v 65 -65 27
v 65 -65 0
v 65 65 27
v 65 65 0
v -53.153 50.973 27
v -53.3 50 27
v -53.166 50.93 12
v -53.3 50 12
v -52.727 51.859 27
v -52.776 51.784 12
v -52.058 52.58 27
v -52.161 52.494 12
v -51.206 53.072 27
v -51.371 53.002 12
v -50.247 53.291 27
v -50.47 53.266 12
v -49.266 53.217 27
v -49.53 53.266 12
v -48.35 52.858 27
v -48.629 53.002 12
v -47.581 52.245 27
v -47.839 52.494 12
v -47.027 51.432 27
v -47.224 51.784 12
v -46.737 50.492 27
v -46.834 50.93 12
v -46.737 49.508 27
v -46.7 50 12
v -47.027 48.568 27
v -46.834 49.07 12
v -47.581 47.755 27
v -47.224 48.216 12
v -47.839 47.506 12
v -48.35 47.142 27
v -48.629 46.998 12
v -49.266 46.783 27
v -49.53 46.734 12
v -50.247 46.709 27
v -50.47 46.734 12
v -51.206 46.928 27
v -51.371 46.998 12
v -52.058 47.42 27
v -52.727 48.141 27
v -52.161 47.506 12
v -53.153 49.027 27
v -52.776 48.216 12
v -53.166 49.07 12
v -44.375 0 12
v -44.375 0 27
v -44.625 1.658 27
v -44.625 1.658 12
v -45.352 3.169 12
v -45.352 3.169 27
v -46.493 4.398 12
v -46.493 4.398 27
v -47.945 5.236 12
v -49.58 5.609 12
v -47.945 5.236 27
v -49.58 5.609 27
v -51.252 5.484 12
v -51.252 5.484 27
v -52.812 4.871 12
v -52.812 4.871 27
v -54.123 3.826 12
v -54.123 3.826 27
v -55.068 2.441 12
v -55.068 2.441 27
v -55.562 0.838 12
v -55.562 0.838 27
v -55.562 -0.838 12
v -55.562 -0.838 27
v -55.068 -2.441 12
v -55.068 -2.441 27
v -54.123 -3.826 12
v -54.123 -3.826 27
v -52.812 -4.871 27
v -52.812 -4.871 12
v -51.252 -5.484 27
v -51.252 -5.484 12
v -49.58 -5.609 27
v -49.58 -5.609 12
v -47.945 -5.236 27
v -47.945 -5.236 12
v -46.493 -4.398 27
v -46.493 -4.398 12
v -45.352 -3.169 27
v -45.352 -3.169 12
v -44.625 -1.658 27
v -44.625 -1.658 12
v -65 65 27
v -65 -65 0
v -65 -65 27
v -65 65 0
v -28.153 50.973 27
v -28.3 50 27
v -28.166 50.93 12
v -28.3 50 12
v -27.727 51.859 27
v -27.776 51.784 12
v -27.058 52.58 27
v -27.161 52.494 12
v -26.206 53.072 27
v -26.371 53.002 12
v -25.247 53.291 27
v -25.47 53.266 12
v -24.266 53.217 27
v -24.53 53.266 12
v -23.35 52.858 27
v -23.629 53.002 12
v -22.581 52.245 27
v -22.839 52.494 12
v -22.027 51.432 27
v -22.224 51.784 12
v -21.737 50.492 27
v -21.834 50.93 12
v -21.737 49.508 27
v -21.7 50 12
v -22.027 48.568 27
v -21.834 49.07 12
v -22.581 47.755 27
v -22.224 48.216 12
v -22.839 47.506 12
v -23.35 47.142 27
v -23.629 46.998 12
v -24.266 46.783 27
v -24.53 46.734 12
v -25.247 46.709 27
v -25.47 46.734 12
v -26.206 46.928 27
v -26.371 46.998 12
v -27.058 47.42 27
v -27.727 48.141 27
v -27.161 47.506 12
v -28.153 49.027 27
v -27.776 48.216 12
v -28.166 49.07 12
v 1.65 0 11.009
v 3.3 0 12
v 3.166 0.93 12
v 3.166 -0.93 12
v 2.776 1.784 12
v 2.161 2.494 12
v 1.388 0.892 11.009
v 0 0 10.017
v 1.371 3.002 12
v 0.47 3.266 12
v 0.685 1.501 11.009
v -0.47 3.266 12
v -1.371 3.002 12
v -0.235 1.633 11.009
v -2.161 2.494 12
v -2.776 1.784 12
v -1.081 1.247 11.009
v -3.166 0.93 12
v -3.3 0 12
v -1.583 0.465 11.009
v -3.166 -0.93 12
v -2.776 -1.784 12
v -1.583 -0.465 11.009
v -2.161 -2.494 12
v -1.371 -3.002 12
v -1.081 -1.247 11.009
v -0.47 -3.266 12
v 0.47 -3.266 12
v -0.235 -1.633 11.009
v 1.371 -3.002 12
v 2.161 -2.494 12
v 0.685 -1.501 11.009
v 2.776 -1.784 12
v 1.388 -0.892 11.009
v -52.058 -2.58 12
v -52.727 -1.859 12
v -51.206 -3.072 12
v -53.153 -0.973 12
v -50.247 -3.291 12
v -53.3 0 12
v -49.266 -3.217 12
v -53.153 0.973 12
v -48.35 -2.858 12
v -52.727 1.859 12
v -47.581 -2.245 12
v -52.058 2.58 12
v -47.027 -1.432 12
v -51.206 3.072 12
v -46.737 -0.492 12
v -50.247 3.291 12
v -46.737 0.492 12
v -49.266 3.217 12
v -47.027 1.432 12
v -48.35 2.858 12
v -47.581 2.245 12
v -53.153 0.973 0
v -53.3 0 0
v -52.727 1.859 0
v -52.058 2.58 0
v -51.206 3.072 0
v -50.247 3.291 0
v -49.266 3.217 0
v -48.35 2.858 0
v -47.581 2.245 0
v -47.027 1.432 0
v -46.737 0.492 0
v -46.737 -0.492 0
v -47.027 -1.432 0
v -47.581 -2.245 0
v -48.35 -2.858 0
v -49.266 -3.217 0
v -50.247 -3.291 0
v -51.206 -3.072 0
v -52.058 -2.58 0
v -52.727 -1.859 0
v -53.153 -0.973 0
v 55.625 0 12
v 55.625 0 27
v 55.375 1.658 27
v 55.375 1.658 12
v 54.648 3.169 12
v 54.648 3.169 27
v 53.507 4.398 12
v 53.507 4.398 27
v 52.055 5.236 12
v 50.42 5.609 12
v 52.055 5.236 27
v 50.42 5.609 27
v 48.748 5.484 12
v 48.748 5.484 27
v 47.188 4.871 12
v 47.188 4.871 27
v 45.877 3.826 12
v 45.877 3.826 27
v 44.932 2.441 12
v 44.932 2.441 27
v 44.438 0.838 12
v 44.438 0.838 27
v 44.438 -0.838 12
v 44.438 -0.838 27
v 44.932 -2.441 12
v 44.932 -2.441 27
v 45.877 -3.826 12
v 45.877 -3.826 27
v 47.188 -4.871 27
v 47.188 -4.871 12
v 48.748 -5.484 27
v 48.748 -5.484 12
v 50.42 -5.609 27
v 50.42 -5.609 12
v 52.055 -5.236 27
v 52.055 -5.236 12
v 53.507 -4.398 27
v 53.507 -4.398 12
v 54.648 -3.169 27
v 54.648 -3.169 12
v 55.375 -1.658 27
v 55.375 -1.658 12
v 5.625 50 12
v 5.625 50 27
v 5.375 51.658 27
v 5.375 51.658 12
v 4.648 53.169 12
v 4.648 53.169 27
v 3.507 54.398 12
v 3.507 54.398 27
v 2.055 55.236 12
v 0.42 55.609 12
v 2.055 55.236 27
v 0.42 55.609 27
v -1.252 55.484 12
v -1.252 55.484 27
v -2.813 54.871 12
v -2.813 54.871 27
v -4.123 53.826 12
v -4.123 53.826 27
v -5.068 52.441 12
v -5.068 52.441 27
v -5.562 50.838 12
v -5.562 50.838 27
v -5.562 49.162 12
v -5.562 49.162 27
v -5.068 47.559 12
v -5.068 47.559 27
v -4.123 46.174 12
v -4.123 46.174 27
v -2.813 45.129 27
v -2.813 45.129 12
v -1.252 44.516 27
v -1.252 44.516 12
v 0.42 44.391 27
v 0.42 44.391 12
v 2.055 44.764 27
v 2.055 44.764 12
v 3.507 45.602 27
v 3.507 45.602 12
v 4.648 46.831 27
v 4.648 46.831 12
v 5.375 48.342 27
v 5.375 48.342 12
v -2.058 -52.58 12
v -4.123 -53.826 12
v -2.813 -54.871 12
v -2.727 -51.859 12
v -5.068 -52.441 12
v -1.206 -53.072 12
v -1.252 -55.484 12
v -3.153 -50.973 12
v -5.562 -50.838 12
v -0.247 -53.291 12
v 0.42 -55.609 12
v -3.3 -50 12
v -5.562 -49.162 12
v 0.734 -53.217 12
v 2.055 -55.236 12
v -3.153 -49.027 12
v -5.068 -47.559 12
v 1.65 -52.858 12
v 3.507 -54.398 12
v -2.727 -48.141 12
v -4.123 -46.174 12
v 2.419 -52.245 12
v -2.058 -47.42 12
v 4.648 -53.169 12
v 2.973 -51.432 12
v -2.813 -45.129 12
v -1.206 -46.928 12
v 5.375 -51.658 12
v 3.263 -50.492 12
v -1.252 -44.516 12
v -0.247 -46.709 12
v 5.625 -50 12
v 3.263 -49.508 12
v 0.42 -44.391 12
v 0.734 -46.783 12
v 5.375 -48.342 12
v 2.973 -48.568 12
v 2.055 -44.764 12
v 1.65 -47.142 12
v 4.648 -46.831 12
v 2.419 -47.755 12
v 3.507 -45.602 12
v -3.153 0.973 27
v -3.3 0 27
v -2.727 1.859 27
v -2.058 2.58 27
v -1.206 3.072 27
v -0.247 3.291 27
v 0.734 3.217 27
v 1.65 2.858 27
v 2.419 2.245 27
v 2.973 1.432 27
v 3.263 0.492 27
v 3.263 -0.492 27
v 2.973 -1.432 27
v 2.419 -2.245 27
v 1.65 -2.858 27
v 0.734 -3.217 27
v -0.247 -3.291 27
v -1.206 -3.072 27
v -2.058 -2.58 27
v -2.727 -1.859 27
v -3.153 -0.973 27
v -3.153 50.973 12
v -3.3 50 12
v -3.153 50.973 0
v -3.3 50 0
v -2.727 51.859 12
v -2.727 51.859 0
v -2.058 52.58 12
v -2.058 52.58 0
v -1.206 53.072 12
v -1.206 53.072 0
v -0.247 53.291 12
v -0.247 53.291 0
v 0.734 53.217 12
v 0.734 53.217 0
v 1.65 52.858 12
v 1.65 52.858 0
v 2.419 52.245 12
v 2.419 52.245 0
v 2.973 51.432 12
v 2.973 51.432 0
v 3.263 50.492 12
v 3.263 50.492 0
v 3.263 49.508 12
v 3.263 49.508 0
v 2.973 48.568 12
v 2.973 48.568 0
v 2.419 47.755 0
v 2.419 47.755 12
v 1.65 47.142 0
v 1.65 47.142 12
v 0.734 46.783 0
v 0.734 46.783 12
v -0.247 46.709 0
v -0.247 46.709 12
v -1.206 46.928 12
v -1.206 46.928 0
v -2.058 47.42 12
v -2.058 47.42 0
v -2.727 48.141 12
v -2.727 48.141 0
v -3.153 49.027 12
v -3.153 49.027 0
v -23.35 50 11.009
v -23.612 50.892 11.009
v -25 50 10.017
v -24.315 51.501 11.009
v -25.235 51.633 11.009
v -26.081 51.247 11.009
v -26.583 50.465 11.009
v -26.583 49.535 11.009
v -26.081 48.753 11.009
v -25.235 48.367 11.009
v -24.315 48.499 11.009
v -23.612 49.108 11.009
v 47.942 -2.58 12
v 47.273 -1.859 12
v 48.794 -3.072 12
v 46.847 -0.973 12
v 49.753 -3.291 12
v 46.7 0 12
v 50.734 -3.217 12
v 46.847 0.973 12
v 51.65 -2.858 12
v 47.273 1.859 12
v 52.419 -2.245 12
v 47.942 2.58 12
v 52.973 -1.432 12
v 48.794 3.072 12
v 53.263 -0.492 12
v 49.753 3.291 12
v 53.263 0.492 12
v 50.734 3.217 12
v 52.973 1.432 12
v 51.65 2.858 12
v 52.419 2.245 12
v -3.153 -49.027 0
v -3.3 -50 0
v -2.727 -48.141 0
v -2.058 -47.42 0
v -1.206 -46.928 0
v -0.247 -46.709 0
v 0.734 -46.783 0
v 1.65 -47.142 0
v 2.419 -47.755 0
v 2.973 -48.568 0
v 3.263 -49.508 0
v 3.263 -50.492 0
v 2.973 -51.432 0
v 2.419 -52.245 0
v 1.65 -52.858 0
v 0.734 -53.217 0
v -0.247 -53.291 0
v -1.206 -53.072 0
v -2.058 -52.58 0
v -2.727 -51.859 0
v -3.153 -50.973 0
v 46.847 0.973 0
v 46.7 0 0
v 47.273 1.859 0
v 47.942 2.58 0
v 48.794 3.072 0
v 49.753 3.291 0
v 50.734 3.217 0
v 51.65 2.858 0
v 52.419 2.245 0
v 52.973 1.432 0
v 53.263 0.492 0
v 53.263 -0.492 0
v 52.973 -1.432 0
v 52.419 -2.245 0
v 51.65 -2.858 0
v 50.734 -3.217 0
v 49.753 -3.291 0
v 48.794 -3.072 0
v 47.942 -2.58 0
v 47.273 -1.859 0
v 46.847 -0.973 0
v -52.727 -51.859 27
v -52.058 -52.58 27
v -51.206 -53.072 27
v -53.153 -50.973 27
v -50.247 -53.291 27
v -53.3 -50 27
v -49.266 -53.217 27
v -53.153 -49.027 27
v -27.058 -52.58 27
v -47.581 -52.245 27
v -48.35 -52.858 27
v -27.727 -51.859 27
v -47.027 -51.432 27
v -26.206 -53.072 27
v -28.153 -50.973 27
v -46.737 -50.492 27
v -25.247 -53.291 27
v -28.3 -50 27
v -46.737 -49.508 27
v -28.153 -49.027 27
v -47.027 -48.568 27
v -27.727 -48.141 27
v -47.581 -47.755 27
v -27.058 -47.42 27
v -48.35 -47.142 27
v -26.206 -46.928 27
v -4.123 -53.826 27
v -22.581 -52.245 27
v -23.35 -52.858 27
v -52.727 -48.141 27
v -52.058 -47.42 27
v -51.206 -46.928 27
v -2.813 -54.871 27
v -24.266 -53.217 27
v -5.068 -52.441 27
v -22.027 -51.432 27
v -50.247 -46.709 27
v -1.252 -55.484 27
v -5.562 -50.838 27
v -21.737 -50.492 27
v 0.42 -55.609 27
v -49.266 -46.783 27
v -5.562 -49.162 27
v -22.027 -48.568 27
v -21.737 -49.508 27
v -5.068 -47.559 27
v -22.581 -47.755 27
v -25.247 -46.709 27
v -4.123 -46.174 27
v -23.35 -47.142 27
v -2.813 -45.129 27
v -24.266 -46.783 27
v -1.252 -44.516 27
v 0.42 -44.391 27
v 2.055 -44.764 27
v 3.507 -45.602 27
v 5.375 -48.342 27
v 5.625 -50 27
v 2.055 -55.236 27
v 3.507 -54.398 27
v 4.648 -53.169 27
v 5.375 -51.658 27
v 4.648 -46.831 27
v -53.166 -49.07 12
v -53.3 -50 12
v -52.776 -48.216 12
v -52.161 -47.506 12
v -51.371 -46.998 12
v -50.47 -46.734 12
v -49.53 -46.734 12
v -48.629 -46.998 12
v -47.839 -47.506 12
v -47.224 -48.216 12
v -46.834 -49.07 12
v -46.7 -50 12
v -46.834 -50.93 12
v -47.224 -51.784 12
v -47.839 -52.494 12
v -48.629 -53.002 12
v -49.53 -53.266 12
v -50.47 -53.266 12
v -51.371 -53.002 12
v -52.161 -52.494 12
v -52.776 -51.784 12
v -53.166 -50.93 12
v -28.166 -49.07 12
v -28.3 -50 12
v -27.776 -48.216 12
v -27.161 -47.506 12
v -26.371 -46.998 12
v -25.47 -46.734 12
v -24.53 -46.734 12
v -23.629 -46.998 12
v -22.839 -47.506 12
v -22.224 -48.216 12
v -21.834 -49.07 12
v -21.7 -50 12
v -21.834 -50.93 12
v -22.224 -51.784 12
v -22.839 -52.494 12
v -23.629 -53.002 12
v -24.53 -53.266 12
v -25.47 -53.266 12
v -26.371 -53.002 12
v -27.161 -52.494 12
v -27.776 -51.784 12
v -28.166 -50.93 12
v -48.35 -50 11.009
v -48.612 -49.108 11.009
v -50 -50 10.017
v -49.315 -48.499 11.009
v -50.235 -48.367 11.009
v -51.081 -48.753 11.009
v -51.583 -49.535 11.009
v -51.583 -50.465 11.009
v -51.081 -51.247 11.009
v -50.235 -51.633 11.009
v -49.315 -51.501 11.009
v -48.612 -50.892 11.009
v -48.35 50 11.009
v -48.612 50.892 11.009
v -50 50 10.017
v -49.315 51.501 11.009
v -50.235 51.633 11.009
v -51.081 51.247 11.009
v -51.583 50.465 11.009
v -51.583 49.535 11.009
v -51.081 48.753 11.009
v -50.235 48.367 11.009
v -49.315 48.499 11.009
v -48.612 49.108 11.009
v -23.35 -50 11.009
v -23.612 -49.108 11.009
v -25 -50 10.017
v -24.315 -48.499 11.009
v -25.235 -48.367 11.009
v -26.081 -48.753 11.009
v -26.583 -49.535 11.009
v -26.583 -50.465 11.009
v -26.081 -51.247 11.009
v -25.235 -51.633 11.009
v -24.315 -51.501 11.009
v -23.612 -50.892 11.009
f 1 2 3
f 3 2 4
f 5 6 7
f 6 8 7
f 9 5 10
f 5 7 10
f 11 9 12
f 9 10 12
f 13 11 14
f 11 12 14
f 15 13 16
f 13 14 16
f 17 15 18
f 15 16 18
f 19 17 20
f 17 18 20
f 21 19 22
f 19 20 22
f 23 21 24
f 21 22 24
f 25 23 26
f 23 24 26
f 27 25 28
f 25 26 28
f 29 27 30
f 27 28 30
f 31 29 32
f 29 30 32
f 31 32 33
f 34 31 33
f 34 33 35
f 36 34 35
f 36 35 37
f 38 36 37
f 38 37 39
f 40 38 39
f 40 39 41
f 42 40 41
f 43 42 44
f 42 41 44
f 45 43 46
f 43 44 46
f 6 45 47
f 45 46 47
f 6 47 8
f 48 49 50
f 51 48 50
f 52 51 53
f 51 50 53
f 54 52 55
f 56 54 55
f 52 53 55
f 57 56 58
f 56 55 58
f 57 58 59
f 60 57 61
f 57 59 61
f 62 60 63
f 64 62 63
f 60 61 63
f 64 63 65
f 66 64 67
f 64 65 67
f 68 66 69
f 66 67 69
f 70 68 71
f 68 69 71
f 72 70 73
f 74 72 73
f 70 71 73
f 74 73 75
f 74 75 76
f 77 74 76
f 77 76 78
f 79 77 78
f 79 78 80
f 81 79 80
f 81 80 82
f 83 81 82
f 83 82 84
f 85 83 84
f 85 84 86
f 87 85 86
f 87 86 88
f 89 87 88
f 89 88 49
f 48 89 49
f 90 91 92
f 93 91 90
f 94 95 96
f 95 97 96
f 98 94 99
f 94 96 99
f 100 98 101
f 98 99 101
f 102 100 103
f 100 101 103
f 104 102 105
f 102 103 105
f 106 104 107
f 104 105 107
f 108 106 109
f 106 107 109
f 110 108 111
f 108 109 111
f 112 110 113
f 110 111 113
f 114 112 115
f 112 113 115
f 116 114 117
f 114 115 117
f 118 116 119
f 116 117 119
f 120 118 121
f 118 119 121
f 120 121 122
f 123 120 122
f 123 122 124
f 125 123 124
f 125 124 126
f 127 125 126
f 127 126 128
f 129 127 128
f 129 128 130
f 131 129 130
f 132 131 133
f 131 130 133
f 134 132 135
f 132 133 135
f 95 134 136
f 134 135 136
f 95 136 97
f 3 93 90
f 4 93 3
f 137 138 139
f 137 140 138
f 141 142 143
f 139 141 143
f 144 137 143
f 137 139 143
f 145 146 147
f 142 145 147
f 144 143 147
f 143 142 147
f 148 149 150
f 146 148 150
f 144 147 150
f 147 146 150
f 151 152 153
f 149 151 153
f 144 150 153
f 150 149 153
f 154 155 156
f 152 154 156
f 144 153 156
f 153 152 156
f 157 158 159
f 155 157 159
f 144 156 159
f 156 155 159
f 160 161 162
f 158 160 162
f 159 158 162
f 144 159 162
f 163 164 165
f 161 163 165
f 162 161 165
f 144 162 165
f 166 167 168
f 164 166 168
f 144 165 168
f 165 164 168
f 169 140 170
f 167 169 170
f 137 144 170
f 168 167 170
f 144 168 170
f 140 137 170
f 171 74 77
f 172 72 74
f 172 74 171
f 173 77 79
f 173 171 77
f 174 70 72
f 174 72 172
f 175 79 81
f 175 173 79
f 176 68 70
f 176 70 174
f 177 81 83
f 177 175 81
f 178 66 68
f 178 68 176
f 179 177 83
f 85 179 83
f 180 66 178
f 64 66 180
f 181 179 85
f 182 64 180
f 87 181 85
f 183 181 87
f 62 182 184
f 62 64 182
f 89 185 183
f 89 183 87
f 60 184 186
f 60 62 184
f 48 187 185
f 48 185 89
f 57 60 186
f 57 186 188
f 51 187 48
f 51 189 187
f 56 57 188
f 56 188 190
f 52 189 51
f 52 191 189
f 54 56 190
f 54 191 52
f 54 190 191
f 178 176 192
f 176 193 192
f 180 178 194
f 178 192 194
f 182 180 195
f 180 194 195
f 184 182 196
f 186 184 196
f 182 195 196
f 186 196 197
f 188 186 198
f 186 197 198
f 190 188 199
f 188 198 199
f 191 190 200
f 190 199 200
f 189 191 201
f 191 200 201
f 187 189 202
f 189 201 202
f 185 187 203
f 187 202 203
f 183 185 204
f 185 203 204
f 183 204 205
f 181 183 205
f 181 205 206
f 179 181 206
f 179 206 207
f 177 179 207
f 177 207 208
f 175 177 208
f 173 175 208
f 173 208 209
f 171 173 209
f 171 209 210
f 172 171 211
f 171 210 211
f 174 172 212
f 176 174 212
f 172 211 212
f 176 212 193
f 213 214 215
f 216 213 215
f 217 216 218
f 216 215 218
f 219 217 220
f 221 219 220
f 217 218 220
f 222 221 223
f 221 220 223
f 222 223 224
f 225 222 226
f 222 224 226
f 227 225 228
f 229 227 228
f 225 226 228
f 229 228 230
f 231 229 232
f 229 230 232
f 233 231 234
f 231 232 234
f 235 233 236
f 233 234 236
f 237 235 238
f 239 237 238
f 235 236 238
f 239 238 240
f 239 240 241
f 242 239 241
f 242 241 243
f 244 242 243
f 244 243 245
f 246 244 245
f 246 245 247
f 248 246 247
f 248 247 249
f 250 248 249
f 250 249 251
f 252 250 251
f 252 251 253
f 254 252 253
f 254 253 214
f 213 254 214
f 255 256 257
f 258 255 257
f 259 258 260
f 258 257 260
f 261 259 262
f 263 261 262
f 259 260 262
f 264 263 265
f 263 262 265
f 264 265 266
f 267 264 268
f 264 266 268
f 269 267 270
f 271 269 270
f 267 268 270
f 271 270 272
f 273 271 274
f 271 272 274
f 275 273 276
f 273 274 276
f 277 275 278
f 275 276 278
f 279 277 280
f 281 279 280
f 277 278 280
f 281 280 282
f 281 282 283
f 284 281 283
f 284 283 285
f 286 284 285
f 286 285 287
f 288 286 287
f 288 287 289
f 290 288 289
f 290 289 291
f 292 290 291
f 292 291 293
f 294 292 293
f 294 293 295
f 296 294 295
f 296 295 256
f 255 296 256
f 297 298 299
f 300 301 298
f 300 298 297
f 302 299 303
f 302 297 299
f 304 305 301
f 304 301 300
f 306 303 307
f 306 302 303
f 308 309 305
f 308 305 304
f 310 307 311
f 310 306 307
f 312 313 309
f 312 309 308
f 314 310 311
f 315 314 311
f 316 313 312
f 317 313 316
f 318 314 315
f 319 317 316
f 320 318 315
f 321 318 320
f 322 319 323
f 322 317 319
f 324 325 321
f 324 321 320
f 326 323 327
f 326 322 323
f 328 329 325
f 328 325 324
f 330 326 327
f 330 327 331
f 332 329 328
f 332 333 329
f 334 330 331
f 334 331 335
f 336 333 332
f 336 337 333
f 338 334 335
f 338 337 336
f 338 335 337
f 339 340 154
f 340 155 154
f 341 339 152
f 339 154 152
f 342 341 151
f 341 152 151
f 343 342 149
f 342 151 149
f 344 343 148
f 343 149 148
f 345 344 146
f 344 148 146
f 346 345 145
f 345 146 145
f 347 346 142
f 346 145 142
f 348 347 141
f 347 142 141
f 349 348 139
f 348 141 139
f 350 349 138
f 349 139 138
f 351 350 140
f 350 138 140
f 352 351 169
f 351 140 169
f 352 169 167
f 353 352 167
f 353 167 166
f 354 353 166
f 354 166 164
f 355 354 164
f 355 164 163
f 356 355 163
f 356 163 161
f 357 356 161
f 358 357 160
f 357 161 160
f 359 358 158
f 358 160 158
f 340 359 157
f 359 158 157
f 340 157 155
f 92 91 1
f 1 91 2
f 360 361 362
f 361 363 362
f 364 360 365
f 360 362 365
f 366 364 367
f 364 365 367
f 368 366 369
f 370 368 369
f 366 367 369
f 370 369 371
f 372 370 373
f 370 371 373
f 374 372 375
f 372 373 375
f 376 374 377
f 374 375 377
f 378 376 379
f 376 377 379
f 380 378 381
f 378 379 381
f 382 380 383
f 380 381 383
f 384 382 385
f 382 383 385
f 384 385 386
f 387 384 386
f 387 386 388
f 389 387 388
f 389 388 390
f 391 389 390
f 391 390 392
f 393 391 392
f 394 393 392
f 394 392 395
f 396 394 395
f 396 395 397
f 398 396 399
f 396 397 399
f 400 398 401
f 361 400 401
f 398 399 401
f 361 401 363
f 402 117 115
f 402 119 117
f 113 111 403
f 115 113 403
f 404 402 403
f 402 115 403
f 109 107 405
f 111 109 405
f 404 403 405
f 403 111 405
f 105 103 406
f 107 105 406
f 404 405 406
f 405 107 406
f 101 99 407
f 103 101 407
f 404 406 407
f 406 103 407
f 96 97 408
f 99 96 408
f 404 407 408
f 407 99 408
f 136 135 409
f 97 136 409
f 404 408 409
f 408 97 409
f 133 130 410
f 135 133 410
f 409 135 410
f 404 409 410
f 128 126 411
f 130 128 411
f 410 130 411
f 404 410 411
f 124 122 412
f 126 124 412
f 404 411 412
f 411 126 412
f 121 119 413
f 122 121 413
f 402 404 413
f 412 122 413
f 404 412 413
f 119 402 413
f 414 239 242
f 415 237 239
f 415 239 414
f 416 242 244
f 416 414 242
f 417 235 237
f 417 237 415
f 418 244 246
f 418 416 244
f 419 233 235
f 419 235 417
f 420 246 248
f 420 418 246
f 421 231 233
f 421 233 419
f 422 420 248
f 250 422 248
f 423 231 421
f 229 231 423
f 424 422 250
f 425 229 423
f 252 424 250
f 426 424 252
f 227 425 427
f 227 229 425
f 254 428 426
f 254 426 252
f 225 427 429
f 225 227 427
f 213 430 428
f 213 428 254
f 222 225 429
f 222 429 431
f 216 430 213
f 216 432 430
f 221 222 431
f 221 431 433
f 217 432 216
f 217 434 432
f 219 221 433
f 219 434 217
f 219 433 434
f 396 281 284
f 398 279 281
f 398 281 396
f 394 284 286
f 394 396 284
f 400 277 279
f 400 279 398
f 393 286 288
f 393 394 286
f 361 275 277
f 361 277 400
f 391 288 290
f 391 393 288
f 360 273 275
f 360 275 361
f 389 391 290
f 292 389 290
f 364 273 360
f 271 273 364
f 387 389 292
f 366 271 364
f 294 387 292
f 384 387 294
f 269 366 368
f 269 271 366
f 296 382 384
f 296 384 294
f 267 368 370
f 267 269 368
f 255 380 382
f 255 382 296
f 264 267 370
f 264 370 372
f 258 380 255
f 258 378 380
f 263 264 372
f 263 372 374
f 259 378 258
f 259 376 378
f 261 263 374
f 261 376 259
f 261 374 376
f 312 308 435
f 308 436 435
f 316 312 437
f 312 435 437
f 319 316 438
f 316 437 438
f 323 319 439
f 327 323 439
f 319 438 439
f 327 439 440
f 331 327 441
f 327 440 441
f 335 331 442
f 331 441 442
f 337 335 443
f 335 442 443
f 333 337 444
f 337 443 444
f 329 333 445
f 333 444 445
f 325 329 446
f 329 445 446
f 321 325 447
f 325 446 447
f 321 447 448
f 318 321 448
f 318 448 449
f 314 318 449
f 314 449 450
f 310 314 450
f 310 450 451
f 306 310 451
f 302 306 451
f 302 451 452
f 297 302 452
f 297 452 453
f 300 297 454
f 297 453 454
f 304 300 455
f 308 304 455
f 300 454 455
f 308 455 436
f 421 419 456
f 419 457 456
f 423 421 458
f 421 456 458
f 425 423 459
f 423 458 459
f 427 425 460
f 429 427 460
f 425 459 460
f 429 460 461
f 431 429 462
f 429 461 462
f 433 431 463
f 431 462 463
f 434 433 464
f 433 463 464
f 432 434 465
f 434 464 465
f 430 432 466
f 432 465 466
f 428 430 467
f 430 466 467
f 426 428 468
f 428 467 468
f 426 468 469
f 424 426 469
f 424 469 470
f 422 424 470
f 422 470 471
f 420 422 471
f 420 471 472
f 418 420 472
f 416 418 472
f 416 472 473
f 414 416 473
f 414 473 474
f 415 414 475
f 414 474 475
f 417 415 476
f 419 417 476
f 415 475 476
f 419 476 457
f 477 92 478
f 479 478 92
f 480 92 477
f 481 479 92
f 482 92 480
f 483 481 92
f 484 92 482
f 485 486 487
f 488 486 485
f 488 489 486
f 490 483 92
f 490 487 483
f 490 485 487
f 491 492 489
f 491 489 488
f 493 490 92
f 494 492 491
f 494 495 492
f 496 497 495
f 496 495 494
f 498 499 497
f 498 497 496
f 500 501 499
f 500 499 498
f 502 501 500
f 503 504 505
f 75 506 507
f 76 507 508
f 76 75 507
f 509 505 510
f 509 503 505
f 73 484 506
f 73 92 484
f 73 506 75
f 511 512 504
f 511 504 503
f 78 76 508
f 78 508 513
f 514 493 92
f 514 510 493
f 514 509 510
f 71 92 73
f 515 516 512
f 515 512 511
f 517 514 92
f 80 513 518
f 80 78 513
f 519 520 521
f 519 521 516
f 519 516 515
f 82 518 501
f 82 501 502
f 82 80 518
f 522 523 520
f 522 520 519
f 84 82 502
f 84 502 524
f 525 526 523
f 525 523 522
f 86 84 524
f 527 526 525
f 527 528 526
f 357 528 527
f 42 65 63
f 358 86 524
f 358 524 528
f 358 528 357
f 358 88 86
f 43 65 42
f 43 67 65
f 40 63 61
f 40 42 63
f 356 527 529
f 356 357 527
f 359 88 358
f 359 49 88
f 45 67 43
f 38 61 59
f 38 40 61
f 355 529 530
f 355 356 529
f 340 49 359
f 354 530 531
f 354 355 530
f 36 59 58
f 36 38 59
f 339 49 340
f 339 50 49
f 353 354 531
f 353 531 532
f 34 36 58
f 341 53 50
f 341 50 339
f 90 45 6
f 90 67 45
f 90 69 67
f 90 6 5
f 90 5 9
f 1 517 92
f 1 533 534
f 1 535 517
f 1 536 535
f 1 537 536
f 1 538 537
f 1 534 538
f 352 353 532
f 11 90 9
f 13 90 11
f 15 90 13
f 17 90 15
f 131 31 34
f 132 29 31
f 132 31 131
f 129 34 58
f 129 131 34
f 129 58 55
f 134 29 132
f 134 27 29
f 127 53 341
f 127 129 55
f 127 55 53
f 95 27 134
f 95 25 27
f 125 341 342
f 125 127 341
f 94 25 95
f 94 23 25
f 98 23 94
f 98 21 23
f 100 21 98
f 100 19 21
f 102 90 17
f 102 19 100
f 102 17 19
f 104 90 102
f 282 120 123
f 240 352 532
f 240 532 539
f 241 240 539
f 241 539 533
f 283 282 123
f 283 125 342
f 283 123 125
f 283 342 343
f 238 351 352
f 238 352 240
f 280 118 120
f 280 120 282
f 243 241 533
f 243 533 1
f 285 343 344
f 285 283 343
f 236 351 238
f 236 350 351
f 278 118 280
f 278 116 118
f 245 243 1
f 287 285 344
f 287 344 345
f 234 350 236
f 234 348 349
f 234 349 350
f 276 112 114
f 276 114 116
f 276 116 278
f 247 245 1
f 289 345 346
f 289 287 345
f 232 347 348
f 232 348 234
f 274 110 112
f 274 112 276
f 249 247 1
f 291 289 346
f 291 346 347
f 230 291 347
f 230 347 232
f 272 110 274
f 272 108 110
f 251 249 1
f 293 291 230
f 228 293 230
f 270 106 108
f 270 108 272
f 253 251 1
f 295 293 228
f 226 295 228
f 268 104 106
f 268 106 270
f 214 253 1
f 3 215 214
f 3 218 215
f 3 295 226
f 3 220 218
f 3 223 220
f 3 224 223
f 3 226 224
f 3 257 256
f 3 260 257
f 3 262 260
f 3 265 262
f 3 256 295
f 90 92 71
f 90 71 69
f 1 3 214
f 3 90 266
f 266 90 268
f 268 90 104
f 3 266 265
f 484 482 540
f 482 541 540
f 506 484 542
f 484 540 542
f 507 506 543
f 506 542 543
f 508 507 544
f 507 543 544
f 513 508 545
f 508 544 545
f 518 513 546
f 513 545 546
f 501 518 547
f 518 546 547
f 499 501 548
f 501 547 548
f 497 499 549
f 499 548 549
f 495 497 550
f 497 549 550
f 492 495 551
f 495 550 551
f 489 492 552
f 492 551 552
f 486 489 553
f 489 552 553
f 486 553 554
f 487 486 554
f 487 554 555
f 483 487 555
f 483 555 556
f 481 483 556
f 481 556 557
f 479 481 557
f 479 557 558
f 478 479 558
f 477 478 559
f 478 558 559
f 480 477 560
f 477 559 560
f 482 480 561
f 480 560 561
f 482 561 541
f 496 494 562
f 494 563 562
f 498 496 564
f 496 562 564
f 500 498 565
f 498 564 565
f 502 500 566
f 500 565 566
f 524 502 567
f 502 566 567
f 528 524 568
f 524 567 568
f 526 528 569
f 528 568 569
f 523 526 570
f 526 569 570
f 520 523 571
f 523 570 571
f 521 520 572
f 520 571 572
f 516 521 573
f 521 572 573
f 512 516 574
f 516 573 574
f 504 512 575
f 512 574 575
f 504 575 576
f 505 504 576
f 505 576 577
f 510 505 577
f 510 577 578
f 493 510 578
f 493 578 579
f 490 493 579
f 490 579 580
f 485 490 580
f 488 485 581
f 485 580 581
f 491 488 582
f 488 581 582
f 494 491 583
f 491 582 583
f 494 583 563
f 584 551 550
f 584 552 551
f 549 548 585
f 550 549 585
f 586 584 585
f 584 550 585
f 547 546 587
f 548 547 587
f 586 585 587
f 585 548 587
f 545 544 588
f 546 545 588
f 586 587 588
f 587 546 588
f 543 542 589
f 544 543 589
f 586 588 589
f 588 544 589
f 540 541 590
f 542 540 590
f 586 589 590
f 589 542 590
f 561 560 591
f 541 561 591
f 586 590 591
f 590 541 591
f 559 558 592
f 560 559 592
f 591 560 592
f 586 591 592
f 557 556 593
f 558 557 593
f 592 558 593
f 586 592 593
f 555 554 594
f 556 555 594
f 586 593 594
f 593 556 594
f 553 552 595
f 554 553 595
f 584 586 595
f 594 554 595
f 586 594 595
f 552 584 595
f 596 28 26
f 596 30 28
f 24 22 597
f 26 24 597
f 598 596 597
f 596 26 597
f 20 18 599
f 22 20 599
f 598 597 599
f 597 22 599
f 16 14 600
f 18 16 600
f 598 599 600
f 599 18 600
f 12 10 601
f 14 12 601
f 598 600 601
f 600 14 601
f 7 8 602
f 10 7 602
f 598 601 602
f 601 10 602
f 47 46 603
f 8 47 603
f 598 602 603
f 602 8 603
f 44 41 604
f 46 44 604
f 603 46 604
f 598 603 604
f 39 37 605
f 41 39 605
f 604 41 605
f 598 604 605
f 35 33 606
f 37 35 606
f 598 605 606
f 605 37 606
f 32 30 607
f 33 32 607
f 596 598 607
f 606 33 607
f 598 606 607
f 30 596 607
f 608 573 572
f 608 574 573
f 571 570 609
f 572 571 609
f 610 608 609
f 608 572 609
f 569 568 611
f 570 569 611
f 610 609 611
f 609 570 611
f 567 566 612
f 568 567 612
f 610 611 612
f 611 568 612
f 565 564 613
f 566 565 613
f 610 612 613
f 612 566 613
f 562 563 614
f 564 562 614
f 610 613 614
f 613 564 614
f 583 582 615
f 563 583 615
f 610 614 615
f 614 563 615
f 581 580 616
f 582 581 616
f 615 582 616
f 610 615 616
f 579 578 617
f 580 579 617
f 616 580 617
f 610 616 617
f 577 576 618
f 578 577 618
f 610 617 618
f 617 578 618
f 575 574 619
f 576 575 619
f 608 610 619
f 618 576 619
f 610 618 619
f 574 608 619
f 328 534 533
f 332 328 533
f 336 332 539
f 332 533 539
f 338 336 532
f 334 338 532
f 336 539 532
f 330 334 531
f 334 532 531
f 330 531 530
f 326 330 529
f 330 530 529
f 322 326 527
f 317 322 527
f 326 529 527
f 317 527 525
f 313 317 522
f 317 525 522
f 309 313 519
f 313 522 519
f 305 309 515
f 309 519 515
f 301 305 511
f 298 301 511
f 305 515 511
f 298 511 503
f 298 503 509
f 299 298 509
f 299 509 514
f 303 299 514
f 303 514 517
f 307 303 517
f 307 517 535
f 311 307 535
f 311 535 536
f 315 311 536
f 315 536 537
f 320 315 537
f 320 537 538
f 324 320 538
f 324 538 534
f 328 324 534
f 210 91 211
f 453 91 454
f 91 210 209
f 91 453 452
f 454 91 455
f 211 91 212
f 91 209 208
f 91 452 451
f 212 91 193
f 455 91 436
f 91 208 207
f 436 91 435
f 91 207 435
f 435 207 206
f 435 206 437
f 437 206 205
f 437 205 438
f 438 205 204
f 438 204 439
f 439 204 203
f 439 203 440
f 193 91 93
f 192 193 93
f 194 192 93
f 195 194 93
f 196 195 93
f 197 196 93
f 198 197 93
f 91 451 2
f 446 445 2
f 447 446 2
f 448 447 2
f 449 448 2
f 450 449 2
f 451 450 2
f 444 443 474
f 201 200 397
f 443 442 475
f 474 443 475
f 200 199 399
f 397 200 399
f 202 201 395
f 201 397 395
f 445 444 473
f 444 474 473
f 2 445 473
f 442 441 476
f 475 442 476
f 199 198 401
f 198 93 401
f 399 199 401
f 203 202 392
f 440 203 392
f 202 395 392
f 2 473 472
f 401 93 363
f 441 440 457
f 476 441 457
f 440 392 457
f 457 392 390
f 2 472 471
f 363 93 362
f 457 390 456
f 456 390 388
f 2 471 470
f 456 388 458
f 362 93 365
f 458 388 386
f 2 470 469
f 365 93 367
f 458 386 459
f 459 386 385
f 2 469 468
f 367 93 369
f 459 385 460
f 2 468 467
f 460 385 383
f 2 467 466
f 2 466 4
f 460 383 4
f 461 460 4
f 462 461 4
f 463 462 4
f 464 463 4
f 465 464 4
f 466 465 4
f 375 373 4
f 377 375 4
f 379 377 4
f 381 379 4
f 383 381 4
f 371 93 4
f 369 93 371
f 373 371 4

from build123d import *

# Parameters (mm, degrees)
F0_W           = 130
F0_H           = 130
F1_DEPTH       = 27
F3_D           = 6.6
F3_CBORE_D     = 11.25
F3_CBORE_DEPTH = 15
F4_D           = 6.6
F4_DEPTH       = 15
F4_TIP         = 1.9828400428


with BuildPart() as f1:
    # F0 (on Top) → F1 (new body)
    with BuildSketch(Plane.XY):
        Rectangle(F0_W, F0_H)
    extrude(amount=F1_DEPTH)

    # F3 (through all)
    with Locations(Plane.XY.offset(27)):
        with Locations((0, 50), (-50, 0), (0, -50), (50, 0)):
            CounterBoreHole(F3_D / 2, F3_CBORE_D / 2, F3_CBORE_DEPTH)

    # F4
    with Locations(Plane.XY.offset(27)):
        with Locations((-25, 50), (-25, -50), (-50, -50), (-50, 50), (0, 0)):
            Hole(F4_D / 2, depth=F4_DEPTH)
            with Locations((0, 0, -(F4_DEPTH + F4_TIP / 2))):  # 118° drill point
                Cone(0, F4_D / 2, F4_TIP, mode=Mode.SUBTRACT)


solid = f1.part
